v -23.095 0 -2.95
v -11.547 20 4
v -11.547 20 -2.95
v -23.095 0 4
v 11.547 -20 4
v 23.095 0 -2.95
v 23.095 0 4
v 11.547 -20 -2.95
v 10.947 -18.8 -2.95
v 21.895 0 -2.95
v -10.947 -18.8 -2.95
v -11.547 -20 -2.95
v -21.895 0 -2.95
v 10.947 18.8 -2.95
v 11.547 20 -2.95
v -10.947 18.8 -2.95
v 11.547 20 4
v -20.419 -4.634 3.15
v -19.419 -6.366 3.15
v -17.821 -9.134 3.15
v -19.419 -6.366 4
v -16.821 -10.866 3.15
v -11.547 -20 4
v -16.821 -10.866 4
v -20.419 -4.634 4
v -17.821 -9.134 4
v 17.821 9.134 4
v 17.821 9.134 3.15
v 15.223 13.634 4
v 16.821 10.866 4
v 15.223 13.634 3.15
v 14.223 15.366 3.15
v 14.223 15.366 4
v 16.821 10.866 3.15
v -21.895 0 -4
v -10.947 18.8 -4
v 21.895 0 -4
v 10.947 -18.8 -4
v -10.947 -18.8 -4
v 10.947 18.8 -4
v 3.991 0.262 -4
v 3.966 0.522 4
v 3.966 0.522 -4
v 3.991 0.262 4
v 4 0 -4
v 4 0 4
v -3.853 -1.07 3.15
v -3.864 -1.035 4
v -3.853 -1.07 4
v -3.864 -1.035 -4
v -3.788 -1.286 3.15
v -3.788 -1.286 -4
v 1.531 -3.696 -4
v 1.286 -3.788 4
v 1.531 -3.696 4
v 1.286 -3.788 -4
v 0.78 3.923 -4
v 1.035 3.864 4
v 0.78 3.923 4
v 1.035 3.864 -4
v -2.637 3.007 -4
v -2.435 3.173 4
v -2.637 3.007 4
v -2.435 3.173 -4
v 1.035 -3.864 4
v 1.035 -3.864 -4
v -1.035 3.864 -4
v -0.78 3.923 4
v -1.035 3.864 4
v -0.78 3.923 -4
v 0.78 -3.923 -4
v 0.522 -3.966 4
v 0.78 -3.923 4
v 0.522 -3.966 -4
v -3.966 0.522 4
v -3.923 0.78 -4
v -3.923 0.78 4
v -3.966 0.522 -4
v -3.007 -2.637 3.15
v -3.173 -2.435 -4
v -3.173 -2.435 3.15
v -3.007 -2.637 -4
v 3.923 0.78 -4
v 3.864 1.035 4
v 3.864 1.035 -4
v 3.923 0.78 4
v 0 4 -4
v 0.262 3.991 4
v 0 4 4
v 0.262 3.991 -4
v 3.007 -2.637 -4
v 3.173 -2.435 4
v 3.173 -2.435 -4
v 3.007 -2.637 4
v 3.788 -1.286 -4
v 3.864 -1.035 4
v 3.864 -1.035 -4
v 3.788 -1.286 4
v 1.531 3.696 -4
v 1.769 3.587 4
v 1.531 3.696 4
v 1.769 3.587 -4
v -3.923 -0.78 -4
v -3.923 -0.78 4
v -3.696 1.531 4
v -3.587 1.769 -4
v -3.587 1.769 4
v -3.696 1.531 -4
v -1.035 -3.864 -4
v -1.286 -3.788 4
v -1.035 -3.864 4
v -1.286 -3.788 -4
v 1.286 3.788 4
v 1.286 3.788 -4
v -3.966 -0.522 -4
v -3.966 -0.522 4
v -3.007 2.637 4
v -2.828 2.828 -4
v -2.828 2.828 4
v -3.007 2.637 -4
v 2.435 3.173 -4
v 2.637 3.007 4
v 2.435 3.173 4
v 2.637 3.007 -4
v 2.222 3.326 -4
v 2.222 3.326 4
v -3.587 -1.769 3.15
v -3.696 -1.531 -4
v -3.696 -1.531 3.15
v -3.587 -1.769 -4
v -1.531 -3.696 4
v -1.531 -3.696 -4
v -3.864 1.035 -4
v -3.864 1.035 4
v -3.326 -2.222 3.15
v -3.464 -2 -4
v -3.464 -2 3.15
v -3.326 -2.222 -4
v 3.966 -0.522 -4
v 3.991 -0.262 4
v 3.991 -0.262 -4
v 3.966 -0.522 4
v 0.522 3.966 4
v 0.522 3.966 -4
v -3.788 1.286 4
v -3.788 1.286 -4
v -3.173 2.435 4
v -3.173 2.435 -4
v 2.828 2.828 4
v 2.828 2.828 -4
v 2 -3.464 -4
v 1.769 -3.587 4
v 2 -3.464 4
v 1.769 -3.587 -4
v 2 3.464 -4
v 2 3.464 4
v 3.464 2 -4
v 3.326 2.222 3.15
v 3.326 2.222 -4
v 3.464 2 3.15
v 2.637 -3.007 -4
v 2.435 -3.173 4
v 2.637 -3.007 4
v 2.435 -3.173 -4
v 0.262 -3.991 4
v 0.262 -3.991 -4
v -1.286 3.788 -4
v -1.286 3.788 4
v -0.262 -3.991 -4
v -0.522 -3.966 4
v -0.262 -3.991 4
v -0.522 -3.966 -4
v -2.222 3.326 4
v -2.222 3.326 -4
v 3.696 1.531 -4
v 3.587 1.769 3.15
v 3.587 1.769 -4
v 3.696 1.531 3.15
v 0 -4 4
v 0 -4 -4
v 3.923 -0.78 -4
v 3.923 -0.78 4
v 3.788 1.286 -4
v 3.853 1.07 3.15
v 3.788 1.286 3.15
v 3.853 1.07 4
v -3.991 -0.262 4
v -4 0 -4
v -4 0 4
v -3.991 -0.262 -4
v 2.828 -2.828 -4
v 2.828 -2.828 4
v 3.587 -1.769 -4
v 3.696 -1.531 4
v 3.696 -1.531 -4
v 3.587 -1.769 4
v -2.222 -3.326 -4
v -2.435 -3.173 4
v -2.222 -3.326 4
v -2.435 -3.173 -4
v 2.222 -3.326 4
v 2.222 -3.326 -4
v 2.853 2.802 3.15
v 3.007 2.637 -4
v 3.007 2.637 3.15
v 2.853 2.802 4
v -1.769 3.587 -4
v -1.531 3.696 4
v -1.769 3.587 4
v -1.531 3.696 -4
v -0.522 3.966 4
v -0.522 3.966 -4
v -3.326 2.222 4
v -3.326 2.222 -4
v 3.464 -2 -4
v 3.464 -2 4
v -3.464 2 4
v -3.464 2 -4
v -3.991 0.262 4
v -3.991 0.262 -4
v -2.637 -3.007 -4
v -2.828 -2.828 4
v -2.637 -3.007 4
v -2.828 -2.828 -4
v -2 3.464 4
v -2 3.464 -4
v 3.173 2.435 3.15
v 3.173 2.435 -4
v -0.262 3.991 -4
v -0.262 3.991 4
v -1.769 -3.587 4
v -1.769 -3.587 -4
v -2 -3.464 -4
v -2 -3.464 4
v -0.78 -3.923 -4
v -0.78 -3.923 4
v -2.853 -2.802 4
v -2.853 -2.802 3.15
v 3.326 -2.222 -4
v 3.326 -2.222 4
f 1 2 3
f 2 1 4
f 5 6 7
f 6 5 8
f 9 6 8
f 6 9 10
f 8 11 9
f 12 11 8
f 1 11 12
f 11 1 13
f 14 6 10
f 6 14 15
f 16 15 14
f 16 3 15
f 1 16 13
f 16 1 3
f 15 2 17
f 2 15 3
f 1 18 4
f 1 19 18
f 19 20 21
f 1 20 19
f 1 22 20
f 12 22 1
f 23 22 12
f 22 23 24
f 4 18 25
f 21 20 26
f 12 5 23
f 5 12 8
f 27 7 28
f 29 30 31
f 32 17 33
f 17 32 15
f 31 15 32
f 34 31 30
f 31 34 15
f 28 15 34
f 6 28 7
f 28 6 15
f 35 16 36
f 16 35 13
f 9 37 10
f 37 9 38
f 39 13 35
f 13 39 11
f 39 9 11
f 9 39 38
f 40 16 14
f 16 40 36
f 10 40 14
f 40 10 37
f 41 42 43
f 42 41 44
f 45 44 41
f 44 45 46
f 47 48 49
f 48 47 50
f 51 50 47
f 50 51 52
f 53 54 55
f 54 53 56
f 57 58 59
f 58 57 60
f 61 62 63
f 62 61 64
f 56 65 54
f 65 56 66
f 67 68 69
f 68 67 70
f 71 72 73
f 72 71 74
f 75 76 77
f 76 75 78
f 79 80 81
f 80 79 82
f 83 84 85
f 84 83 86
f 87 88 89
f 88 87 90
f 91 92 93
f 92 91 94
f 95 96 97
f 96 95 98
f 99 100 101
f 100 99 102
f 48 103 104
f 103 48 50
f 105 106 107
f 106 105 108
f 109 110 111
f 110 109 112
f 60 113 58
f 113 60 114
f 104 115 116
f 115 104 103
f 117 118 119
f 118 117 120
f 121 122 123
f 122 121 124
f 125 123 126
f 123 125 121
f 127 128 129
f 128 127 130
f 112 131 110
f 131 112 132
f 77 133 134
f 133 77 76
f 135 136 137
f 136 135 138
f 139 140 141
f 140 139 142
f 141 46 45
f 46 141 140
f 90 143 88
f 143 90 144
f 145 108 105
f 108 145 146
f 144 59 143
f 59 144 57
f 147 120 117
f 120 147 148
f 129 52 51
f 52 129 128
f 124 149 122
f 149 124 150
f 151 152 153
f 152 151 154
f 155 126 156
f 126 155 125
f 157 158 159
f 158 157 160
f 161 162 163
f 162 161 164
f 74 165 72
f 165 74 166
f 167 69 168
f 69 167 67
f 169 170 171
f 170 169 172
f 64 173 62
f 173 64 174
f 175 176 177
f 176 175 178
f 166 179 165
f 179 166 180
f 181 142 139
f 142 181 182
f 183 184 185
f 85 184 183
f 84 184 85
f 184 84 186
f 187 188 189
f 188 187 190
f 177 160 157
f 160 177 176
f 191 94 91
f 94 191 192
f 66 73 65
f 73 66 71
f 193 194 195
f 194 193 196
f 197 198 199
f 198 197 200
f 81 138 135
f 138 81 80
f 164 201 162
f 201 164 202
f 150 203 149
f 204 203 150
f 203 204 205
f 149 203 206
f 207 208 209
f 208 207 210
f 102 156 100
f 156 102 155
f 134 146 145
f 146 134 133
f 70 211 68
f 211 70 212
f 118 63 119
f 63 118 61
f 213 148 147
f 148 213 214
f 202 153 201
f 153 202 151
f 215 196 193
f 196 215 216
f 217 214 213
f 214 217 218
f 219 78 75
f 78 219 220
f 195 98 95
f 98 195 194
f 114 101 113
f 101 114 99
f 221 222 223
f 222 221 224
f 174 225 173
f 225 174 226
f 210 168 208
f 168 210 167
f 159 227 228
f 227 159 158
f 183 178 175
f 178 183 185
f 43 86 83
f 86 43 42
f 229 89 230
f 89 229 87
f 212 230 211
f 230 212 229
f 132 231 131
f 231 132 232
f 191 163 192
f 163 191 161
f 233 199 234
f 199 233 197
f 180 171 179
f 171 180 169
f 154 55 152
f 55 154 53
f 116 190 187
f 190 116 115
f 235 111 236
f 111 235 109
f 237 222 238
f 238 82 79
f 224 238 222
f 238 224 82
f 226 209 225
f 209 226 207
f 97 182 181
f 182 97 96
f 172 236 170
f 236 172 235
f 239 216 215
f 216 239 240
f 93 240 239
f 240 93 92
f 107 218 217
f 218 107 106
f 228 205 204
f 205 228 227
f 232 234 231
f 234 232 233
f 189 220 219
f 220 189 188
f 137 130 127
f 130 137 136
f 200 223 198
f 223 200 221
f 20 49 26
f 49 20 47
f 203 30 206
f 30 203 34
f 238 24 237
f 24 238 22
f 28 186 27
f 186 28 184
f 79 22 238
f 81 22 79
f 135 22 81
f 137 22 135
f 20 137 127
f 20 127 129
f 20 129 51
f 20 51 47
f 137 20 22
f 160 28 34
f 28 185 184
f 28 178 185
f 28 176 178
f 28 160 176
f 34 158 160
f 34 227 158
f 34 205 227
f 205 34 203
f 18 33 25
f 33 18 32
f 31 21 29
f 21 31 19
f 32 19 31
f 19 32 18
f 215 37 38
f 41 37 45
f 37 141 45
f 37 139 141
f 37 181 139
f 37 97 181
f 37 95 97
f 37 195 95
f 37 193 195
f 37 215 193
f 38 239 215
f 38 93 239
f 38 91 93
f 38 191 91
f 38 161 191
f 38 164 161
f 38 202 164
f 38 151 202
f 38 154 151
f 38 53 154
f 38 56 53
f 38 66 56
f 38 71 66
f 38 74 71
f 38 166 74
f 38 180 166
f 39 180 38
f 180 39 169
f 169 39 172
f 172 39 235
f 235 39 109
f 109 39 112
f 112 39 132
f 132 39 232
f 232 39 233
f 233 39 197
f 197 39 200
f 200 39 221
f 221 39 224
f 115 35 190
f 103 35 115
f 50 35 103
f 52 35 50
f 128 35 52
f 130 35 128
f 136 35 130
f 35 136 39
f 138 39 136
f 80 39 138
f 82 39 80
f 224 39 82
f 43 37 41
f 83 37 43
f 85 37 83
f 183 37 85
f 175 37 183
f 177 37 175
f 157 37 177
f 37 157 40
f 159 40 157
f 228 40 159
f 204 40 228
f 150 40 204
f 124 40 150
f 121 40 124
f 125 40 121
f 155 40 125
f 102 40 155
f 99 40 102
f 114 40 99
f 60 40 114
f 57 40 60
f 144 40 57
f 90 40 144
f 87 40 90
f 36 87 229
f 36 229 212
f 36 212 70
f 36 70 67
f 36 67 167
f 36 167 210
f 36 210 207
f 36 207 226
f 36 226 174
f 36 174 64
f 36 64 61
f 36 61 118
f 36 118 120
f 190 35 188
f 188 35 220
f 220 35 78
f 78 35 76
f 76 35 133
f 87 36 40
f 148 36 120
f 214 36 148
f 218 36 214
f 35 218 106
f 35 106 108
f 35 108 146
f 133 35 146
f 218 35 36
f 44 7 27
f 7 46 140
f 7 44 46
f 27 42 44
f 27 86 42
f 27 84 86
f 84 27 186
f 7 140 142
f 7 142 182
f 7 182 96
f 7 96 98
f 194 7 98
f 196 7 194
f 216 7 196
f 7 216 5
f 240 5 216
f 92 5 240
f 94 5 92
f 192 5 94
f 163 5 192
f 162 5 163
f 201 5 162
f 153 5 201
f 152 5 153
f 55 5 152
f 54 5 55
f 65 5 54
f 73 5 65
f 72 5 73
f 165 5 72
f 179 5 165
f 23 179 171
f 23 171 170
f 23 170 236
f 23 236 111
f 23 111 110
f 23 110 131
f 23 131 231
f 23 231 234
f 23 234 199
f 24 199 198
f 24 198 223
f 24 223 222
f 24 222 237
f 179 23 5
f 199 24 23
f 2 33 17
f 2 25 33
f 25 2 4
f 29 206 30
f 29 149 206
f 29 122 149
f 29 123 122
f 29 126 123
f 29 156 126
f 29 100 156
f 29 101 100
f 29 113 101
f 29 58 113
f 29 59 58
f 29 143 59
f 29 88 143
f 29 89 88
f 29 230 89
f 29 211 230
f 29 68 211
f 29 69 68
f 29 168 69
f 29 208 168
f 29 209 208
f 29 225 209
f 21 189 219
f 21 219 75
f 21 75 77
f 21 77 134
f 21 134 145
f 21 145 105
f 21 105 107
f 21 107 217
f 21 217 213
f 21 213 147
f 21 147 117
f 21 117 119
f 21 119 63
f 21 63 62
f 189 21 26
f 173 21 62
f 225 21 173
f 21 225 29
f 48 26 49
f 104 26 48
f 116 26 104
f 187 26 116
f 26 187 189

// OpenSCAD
// Flat hex plate with through-hole, two shallow diagonal grooves on one face,
// and a small perimeter step (thickness change) visible in top/bottom views.
// Bounding box target: ~46.2 x 40.0 x 8.0 mm

$fn = 96;

// --- Parameters (mm) ---
bbox_L = 46.19;
bbox_W = 40.00;
bbox_H = 8.00;

plate_thickness = bbox_H;

// Hex sizing (point-to-point in X, flat-to-flat in Y)
hex_point_to_point_L = bbox_L;   // across points
hex_flat_to_flat_W   = bbox_W;   // across flats

// Hole
hole_d = 8.0;
hole_offset_x = 0.0;
hole_offset_y = 0.0;

// Grooves (on top face)
groove_w = 2.0;
groove_depth = 0.8;
groove_spacing = 6.0;
groove_angle_deg = 30;
groove_len = 70;          // long enough to fully cross the hex
groove_end_r = 1.0;       // rounded ends

// Perimeter step (a shallow recess on the bottom face near the edge)
step_inset = 1.2;         // how far in from the perimeter the step boundary is
step_height = 1.0;        // depth of the recess from the bottom face

// Robust boolean overlap
eps = 0.05;

// --- Helpers ---
function clamp(v, lo, hi) = v < lo ? lo : (v > hi ? hi : v);

// Regular hex polygon by point-to-point (across vertices) and flat-to-flat
module hex2d(ptp, ftf) {
    polygon(points = [
        [ ptp/2, 0],
        [ ptp/4,  ftf/2],
        [-ptp/4,  ftf/2],
        [-ptp/2, 0],
        [-ptp/4, -ftf/2],
        [ ptp/4, -ftf/2]
    ]);
}

module hex_prism(h) {
    linear_extrude(height=h, center=true, convexity=10)
        hex2d(hex_point_to_point_L, hex_flat_to_flat_W);
}

// Inner hex used to define the perimeter step boundary
module inner_hex_prism(h) {
    // Keep inset sane so polygon doesn't invert
    inset = clamp(step_inset, 0, min(hex_point_to_point_L/6, hex_flat_to_flat_W/6));
    linear_extrude(height=h, center=true, convexity=10)
        hex2d(hex_point_to_point_L - 2*inset, hex_flat_to_flat_W - 2*inset);
}

// Through hole
module through_hole() {
    translate([hole_offset_x, hole_offset_y, 0])
        cylinder(d=hole_d, h=plate_thickness + 2, center=true);
}

// Rounded-end groove cutter (capsule-like) extruded to groove depth
module groove_cutter(ypos) {
    zc = plate_thickness/2 - groove_depth/2; // cut into top face
    translate([0, ypos, zc])
        rotate([0, 0, groove_angle_deg])
            linear_extrude(height=groove_depth + 2*eps, center=true, convexity=10)
                hull() {
                    translate([ groove_len/2 - groove_end_r, 0]) circle(r=groove_end_r);
                    translate([-groove_len/2 + groove_end_r, 0]) circle(r=groove_end_r);
                }
}

// Perimeter step: remove a shallow ring from the bottom face near the edge
module perimeter_step_cut() {
    // Cut volume occupies bottom step_height
    zc = -plate_thickness/2 + step_height/2;
    translate([0, 0, zc])
        difference() {
            // Outer boundary: full hex footprint
            hex_prism(step_height + 2*eps);
            // Inner boundary: inset hex footprint
            inner_hex_prism(step_height + 4*eps);
        }
}

// --- Final model ---
difference() {
    // Main solid
    hex_prism(plate_thickness);

    // Subtractions
    union() {
        through_hole();

        // Two shallow, parallel diagonal grooves on ONE face (top)
        groove_cutter(0);
        groove_cutter(groove_spacing);

        // Perimeter step-like thickness change (bottom recess ring)
        perimeter_step_cut();
    }
}
